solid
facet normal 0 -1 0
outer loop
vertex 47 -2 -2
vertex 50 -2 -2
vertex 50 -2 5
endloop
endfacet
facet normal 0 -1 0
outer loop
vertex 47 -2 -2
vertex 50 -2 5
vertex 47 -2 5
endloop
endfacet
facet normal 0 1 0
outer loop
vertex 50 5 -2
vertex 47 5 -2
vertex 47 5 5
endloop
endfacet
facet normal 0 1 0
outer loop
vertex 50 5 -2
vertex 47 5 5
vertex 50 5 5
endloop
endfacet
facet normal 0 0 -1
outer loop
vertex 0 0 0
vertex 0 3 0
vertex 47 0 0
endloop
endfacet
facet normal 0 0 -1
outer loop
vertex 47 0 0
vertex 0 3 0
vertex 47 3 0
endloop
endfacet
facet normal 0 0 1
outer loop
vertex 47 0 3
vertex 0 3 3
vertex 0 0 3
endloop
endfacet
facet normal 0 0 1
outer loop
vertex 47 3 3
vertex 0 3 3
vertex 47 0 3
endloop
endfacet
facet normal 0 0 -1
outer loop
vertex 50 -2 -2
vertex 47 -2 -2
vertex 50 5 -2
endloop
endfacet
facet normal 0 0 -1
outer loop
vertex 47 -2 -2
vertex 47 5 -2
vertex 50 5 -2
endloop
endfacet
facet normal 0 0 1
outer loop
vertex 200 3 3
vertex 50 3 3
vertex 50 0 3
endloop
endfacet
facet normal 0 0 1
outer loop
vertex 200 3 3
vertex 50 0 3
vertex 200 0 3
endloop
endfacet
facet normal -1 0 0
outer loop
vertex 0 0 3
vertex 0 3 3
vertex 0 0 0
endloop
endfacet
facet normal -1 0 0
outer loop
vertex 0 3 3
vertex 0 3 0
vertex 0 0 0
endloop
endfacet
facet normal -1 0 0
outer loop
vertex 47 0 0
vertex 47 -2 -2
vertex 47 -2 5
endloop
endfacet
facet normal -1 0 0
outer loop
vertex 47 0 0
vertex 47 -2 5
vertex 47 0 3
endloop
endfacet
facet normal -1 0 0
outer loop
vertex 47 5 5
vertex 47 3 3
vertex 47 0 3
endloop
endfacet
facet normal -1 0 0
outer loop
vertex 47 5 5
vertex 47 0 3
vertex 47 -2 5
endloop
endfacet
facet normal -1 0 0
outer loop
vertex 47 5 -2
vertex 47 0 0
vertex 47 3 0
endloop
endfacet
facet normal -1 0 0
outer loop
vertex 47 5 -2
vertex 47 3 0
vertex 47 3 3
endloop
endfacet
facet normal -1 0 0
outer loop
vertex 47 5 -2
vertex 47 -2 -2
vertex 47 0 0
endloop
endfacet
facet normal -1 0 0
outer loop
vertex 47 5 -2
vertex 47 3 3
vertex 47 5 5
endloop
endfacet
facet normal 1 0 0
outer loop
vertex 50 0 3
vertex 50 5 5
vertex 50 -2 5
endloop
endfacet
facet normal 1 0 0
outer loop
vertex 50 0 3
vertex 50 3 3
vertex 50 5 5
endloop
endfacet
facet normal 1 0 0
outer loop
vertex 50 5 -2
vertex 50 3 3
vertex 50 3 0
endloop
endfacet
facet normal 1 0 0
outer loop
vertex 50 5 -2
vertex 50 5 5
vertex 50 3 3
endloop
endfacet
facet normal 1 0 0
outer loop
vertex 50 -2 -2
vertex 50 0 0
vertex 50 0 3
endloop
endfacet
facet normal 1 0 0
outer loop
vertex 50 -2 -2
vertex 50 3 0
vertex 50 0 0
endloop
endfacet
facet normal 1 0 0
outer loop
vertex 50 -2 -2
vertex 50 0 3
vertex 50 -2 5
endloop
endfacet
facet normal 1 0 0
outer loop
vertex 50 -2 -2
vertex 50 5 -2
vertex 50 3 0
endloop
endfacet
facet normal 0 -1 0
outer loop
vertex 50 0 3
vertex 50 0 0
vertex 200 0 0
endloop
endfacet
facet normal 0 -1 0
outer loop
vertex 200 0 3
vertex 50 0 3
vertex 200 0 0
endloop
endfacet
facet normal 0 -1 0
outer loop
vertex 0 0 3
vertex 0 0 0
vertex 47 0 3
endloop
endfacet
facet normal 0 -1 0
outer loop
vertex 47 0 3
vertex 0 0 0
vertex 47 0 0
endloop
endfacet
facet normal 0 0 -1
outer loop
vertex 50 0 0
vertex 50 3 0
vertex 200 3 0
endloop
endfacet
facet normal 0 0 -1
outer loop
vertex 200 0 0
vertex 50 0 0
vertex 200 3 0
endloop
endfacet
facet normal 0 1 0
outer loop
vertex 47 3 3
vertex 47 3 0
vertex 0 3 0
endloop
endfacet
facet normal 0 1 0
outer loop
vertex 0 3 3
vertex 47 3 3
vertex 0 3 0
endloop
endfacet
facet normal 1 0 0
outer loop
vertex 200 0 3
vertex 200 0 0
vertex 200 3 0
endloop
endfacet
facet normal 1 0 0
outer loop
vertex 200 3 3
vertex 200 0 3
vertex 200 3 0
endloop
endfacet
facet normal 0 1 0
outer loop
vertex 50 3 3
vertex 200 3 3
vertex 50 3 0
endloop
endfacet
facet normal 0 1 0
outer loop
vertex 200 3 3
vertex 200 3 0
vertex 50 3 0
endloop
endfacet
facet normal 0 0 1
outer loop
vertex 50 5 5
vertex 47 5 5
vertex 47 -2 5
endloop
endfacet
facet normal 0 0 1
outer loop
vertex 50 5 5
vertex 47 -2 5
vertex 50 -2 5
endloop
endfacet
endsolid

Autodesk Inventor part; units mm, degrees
ref_plane "YZ Plane" through (0, 0, 0) normal (1, 0, 0) x (0, 1, 0)
ref_plane "XZ Plane" through (0, 0, 0) normal (0, 1, 0) x (-1, 0, 0)
ref_plane "XY Plane" through (0, 0, 0) normal (0, 0, 1) x (1, 0, 0)
sketch "Skizze4" plane through (0, 0, 0) normal (0, 0, 1) x (1, 0, 0)
  line L0 (0, 0) -> (200, 0)
  line L1 (200, 0) -> (200, 3)
  line L2 (200, 3) -> (0, 3)
  line L3 (0, 3) -> (0, 0)
  dimension "d12" = 200
  dimension "d13" = 3
extrude "Extrusion4" add sketch "Skizze4" along normal blind 3
sketch "Skizze5" plane through (0, 0, 3) normal (0, 0, 1) x (1, 0, 0)
  line L0 (47, 5) -> (50, 5)
  line L1 (50, 5) -> (50, -2)
  line L2 (50, -2) -> (47, -2)
  line L3 (47, -2) -> (47, 5)
  line L4 (200, 0) -> (200, 3) projected
  line L5 (0, 3) -> (0, 0) projected
  line L6 (200, 3) -> (0, 3) projected
  line L7 (0, 0) -> (200, 0) projected
  dimension "d16" = 150
  dimension "d17" = 47
  dimension "d18" = 2
  dimension "d19" = 2
extrude "Extrusion5" add sketch "Skizze5" along normal blind 2 and the other way blind 5 contours L0 L1 L6 L3 | L6 L1 L7 L3 | L7 L1 L2 L3
properties part number "MiddleStick"
